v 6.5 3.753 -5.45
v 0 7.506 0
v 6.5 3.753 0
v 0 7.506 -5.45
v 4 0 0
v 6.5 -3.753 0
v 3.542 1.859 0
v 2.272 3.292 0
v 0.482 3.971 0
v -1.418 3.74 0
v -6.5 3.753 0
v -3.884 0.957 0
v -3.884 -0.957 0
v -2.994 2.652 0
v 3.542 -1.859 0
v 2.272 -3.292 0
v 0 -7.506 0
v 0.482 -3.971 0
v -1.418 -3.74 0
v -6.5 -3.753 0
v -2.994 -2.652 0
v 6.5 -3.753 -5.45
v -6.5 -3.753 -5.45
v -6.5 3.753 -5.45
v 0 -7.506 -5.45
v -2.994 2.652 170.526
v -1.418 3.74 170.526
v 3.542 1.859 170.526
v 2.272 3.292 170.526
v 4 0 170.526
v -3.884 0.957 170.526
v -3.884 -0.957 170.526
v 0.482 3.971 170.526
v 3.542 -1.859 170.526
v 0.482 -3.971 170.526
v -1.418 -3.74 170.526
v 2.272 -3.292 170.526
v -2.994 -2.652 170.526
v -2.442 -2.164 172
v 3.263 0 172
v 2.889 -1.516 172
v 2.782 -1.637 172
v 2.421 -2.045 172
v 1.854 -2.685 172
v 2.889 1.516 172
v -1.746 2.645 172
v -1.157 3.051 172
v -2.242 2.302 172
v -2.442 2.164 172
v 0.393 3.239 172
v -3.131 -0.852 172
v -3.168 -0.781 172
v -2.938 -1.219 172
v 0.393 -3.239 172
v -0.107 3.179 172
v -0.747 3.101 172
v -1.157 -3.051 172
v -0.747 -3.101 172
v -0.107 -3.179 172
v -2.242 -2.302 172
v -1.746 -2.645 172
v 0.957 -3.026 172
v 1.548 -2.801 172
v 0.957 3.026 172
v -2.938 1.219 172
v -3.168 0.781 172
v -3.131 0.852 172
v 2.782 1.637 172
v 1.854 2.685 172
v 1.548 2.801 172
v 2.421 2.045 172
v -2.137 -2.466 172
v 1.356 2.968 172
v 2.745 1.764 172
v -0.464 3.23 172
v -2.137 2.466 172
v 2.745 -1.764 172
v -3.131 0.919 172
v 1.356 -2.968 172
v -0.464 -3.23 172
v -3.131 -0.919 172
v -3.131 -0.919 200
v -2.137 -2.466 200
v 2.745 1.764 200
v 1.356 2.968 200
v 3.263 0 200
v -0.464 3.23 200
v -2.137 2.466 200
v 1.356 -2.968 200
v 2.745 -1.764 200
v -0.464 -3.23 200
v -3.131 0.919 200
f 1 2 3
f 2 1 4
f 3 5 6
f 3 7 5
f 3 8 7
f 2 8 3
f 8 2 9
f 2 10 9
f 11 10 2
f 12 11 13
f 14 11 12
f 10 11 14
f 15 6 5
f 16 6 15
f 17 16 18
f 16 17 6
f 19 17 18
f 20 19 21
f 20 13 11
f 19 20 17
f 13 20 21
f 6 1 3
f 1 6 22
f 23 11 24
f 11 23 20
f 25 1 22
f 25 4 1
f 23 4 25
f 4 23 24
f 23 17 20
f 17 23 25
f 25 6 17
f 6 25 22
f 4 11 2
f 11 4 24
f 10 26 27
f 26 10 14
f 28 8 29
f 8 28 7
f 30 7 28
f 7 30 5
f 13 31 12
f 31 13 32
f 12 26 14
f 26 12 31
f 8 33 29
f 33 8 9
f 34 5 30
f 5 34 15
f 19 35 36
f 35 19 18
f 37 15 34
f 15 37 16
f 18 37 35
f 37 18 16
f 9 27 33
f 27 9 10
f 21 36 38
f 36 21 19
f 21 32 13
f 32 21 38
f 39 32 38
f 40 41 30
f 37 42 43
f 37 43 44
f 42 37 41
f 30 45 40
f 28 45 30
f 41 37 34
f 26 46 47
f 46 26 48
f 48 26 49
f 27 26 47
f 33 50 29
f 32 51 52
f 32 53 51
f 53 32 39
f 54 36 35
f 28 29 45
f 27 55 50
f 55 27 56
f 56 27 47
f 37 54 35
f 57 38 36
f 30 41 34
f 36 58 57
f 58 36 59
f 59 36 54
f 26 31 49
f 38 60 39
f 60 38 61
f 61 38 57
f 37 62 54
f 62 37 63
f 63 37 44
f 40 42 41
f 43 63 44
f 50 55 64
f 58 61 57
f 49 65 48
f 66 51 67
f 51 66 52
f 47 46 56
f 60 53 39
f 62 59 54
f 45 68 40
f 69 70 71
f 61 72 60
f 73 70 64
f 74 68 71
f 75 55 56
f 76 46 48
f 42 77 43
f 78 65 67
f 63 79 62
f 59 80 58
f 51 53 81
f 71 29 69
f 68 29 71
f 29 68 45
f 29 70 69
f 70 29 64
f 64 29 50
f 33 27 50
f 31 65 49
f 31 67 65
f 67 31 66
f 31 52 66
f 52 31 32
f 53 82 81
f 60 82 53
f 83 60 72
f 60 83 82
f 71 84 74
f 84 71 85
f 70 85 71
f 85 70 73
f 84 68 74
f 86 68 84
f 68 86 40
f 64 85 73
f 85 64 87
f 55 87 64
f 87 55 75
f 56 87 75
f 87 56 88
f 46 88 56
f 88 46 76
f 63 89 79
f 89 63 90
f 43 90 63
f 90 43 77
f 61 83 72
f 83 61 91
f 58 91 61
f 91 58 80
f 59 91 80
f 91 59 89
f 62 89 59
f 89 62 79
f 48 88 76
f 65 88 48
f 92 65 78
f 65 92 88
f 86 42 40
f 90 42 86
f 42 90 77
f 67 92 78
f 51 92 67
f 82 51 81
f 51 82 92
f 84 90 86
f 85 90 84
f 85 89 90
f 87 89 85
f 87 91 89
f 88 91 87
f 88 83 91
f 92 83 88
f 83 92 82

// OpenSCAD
// file: ThreadExtrude.scad
use <ThreadBase.scad>;

inch = 25.4;

function bsp_profile(iSize) = 
    let (h = bsp_h_basic(iSize), y = bsp_h_basic(iSize)*tan(55/2), p = bsp_pitch(iSize), d = bsp_d_major(iSize)) [
        [d/2-1.5*h,0],
        [d/2-h,0],
        [d/2-h,p/4-y/2],
        [d/2,p/4+y/2],
        [d/2,3*p/4-y/2],
        [d/2-h,3*p/4+y/2],
        [d/2-h,p],
        [d/2-1.5*h,p]
    ];

function metric_profile(d = 10, pitch = 1.5) = 
    let (h = pitch*sqrt(3)/2) [
        [d/2-5*h/8,pitch/8], 
        [d/2,7*pitch/16], 
        [d/2,9*pitch/16], 
        [d/2-5*h/8,7*pitch/8]
    ];

/*
function metric_profile(d = 10, pitch = 1.5) = 
    let (h = pitch*sqrt(3)/2) [
        [d/2-7*h/8,0],
        [d/2-5*h/8,0],
        [d/2-5*h/8,pitch/8], 
        [d/2,7*pitch/16], 
        [d/2,9*pitch/16], 
        [d/2-5*h/8,7*pitch/8],
        [d/2-5*h/8,pitch],
        [d/2-7*h/8,pitch]
    ];
*/

function metric_d_min(d = 10, pitch = 1.5) = d-sqrt(3)*5/8*pitch+0.1*pitch;

function fragments() = $fn < 18 ? 18 : $fn;

module thread_segment(threadProfilePolygon = metric_profile(), pitch = 2)
{
    for (v = threadProfilePolygon)
    {
        assert(v[0] > 0, "All points of thread profile polygon must have positive x values");
    }
    polPoints = len(threadProfilePolygon);
    assert(polPoints > 0, "Thread profile polygon must have at least 3 points");
    fn = fragments();
    faces = concat(
        [[for (j = [1:polPoints]) polPoints-j]], 
        [[for (j = [0:polPoints-1]) polPoints+j]],
        [for (j = [0:polPoints-1]) [j,(j+1) % polPoints,((j+1) % polPoints)+polPoints,j+polPoints]]);
    //multiplication by 1.001 ensures, that segments overlap by 0.1 % anglewise
    points = concat(
        [for (v = threadProfilePolygon) [v[0],0,v[1]]],
        [for (v = threadProfilePolygon) [cos(1.001*360/fn)*v[0],sin(1.001*360/fn)*v[0],v[1]+pitch/fn]]);
    polyhedron(faces = faces, points = points);    
}

*thread_segment($fn = 72);

module thread_extrude(threadProfilePolygon = metric_profile(), pitch = 1.5, angle = 720)
{
    fn = fragments();
    segmentCount = ceil(fn*angle/360);
    assert(segmentCount > 0, "Angle must be positive")
    for (i = [0:segmentCount-1])
    {
        rotate(a = i*360/fn) 
        {
            translate([0,0,i*pitch/fn]) 
            {
                thread_segment(threadProfilePolygon = threadProfilePolygon, pitch = pitch);
            }
        }
    }
}

module metric_thread(d = 10, pitch = 1.5, h = 15)
{
    assert(pitch!=0, "Pitch cannot be 0");
    assert(h > 0, "Height must be positive");
    intersection()
    {
        translate([0,0,-pitch]) {thread_extrude(metric_profile(d, pitch), pitch, 360*h/pitch+360);}
        cylinder(d = d, h = h);
    }
}

module bspp_thread(iSize = 1/4, h = 20)
{
    assert(h > 0, "Height must be positive");
    intersection()
    {
        pitch = bsp_pitch(iSize);
        translate([0,0,-pitch]) {thread_extrude(bsp_profile(iSize), pitch, 360*h/pitch+360);}
        cylinder(d = bsp_d_major(iSize), h = h);
    }
}

*thread_extrude($fn = 36, angle = 3600);

*metric_thread(h = 3, $fn = 36);

*translate([0,0,20]) {metric_thread(pitch = -1.5, h = 3, $fn = 36);}
*difference()
{
    translate([0,0,-1]) {cylinder(d = 12, h = 6);}
    translate([0,0,-1]) {cylinder(d = 8, h = 7);}
    thread_extrude($fn = 36);
}

pitch = 1.5;
for (i = [0:3])
{
    translate([0,0,i*pitch]) {render() {thread_extrude(pitch = pitch, angle = 360, $fn = 72);}}
}
// file: ThreadBase.scad
function hex_cap_screw_dk(mSize) = lookup(
    mSize,
    [   [2,3.98],
        [2.5,4.68],
        [3,5.68],
        [4,7.22],
        [5,8.72],
        [6,10.22],
        [8,13.27],
        [10,16.27],
        [12,18.27]]);

function nut_s(mSize) = lookup(
    mSize,
    [   [ 2  , 4  ],
        [ 2.5, 5  ],
        [ 3  , 5.5],
        [ 4  , 7  ],
        [ 5  , 8  ],
        [ 6  ,10  ],
        [ 8  ,13  ],
        [10  ,17  ],
        [12  ,19  ]]);

function lock_nut_h(mSize) = lookup(
    mSize,
    [   [ 2  , 2.8],
        [ 2.5, 3  ],
        [ 3  , 3.9],
        [ 4  , 5  ],
        [ 5  , 5  ],
        [ 6  , 5.9],
        [ 8  , 7.9],
        [10  , 9.8],
        [12  ,12  ]]);

function nut_m(mSize) = lookup(
    mSize,
    [   [ 2  , 1.6],
        [ 2.5, 2  ],
        [ 3  , 2.4],
        [ 4  , 3.2],
        [ 5  , 4  ],
        [ 6  , 5  ],
        [ 8  , 6.5],
        [10  , 8  ],
        [12  ,10  ]]);

function bolt_s(mSize) = nut_s(mSize);


function bolt_k(mSize) = lookup(
    mSize,
    [   [ 3, 2.12],
        [ 4, 2.92],
        [ 5, 3.65],
        [ 6, 4.15],
        [ 8, 5.45],
        [10, 6.58],
        [12, 7.68]]);


function bolt_b(mSize, L) = let (
bolt_b_values = [   
    [ 3,[12]],
    [ 4,[14]],
    [ 5,[16,22]],
    [ 6,[18,24]],
    [ 8,[22,28]],
    [10,[26,32,45]],
    [12,[30,36,49]]]) bolt_b_values[search(mSize,bolt_b_values)[0]][1][L>200?2:(L>125?1:0)];

function pitch(mSize) = lookup(
    mSize,
    [   [2,0.4],
        [2.5,0.45],
        [3,0.5],
        [4,0.7],
        [5,0.8],
        [6,1],
        [8,1.25],
        [10,1.5],
        [12,1.75],
        [14,2],
        [16,2],
        [18,2.5],
        [20,2.5]]);

module nut_profile(mSize = 5, axis = "z", revDir = false)
{
    orient_to_axis(axis = axis, revDir = revDir)
    {
        d = nut_s(mSize)/sin(60);
        points = [for (a = [60:60:360]) d/2 * [cos(a), sin(a)]]; 
        polygon(points);
    }
}

inch = 25.4;

function bsp_tpi(iSize) = lookup(
    iSize,
    [   [1/16,28],
        [1/8,28],
        [1/4,19],
        [3/8,19],
        [1/2,14],
        [3/4,14],
        [1,11],
        [1.25,11],
        [1.5,11],
        [2,11],
        [2.5,11],
        [3,11],
        [4,11],
        [5,11],
        [6,11]]);

function bsp_pitch(iSize) = inch/bsp_tpi(iSize);

function bsp_d_major(iSize) = lookup(
    iSize,
    [   [1/16,7.723],
        [1/8,9.728],
        [1/4,13.157],
        [3/8,16.662],
        [1/2,20.995],
        [3/4,26.441],
        [1,33.249],
        [1.25,41.910],
        [1.5,47.803],
        [2,59.614],
        [2.5,75.184],
        [3,87.884],
        [4,113.03],
        [5,138.430],
        [6,163.830]]);

function bsp_h_v(iSize) = bsp_pitch(iSize)/(2*tan(55/2));

function bsp_h_basic(iSize) = 2*bsp_h_v(iSize)/3;

function bsp_d_minor(iSize) = bsp_d_major(iSize)-2*bsp_h_basic(iSize);

module orient_to_axis(axis = "x", revDir = false)
{
    if (axis=="x")
    {
        rotate(a = 90, v = [0,1,0]) orient_to_axis(axis = "z",revDir=revDir) {children();};
    }
    else if (axis=="y")
    {
        rotate(a = -90, v = [1,0,0]) orient_to_axis(axis = "z",revDir=revDir) {children();};
    }
    else if (axis=="z")
    {
        rotate(a = revDir ? 180 : 0, v = [1,0,0]) {children();}
    }
    else
    {
        assert(false,str("unknown axis ",axis));
    }
}
// main file
use <ThreadBase.scad>;
use <ThreadExtrude.scad>;

module generic_metric_bolt(d, L, b, generate_thread = !$preview)
{
    s = bolt_s(d);
    k = bolt_k(d);
    d_min = metric_d_min(d);
    translate([0,0,-k]) {linear_extrude(k) {polygon([for (a = [60:60:360]) s/(2*cos(30))*[sin(a),cos(a)]]);}}
    cylinder(d = d, h = L-b-d+d_min);
    translate([0,0,L-b-d+d_min]) 
    {
        cylinder(d1 = d, d2 = d_min, h = d-d_min);
        if (generate_thread) {metric_thread(d, pitch(d), b+d-d_min);}
    }
    translate([0,0,L-b]) {cylinder(d = d_min, h = b);}
}

module din931_bolt(d, L, generate_thread = !$preview)
{
    generic_metric_bolt(d, L, bolt_b(d,L), generate_thread);
}

for (mSize = [3:12], L = [50, 150, 250])
{
    echo("M,L,b",mSize,L,bolt_b(mSize,L));
}

din931_bolt(8, 200);
